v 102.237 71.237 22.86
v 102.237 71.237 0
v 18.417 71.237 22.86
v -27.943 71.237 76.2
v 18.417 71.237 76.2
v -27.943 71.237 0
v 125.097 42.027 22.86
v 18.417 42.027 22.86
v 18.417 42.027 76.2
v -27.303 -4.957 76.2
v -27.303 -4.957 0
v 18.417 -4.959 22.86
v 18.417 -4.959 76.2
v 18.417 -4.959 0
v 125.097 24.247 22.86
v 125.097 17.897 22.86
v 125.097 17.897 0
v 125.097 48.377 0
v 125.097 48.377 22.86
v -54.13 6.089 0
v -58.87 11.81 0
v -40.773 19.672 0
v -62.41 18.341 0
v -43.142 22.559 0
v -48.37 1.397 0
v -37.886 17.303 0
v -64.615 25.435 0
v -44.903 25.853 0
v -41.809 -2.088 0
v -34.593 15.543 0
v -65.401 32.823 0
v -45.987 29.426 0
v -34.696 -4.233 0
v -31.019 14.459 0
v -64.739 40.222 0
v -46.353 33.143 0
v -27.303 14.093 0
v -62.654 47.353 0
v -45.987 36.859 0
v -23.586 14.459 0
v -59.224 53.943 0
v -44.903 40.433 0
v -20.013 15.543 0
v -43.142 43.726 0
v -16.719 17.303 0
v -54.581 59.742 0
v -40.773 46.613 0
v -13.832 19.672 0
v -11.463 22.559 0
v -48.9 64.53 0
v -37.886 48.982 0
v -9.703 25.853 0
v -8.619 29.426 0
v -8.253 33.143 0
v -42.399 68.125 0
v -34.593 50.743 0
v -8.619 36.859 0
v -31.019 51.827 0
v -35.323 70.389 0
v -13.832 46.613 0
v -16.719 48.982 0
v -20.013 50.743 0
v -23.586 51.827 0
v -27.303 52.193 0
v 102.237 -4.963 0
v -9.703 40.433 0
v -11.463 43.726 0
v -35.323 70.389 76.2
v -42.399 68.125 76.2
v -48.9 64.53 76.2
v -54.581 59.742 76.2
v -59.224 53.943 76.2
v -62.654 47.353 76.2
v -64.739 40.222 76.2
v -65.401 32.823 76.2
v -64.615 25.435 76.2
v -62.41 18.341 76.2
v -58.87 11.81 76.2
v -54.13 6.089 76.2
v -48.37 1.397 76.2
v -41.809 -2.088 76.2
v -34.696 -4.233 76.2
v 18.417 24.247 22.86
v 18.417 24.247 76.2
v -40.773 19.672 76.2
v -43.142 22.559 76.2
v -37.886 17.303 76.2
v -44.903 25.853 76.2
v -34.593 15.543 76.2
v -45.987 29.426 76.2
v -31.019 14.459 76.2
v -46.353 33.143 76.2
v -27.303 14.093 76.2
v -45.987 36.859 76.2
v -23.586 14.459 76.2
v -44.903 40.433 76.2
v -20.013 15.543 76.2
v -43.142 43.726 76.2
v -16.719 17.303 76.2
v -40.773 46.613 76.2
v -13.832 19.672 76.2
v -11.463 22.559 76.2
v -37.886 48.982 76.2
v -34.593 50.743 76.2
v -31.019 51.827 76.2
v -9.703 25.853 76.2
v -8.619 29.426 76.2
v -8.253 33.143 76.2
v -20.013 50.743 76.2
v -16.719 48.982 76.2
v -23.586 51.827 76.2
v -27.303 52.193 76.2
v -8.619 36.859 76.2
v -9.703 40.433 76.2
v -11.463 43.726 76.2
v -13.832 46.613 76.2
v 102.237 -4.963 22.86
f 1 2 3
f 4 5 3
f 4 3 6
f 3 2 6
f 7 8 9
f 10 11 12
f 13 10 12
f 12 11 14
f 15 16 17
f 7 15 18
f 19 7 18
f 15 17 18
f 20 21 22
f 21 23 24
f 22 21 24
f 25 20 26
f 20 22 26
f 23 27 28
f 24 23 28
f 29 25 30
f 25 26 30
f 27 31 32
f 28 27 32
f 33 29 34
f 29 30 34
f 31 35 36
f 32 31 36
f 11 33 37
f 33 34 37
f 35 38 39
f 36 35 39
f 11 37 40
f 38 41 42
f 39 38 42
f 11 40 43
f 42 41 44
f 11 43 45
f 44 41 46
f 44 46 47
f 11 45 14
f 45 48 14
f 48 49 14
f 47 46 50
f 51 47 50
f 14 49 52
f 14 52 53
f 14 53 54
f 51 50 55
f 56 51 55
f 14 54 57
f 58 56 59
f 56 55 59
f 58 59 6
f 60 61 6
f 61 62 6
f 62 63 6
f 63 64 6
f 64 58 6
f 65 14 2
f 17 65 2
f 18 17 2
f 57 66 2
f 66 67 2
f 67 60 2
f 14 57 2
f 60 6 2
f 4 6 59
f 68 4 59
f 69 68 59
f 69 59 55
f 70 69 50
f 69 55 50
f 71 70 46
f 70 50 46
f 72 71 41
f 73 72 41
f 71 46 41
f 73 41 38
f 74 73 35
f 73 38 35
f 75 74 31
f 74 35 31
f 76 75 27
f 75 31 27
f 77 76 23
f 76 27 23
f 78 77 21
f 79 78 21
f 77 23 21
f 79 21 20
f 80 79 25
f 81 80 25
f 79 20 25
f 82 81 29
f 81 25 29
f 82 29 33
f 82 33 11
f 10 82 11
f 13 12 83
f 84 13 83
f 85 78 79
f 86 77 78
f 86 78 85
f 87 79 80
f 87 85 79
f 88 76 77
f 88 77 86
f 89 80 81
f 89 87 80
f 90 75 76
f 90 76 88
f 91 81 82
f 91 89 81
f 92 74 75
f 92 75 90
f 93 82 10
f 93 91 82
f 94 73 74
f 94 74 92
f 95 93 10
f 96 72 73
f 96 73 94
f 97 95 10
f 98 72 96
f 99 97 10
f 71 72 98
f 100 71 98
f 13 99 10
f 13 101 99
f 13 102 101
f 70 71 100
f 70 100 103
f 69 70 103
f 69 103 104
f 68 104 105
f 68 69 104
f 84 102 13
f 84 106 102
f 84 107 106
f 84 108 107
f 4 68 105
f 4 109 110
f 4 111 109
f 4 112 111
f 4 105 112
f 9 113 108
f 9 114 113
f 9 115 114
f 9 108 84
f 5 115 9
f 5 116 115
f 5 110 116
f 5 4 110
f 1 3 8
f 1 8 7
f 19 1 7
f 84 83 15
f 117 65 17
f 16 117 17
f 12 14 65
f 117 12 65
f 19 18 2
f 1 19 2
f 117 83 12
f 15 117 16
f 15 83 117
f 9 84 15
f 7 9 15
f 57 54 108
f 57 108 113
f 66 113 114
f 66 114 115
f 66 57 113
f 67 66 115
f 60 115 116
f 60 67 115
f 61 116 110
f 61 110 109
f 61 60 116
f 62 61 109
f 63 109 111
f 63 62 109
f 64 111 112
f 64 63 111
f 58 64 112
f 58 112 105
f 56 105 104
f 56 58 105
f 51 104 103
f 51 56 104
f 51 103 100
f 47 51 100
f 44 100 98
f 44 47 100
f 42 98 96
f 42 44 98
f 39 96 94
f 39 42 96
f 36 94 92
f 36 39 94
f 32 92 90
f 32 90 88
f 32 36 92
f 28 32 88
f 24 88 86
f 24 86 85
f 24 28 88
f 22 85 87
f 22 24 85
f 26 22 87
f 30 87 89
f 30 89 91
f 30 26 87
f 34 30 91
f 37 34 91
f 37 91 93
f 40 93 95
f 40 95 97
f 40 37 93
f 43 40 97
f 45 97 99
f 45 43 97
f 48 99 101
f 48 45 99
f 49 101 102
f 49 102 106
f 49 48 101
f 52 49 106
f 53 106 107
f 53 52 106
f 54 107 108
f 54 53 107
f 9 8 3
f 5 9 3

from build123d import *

# Parameters (mm, degrees)
F0_R     = 19.05
F1_DEPTH = 76.2
F2_DEPTH = 22.86
F0_W     = 106.68
F0_H     = 17.78
F3_DEPTH = 76.2
F5_DEPTH = 25.4


with BuildPart() as f1:
    # F0 (on Top) → F1 (new body)
    with BuildSketch(Plane.XY):
        with BuildLine():
            Line((18.417318, 71.237453), (-26.662783, 71.237453))
            Line((-26.662783, 71.237453), (-27.942582, 71.237453))
            ThreePointArc((-27.942582, 71.237453), (-65.401339, 32.822866), (-27.302682, -4.957173))
            Line((-27.302682, -4.957173), (18.417318, -4.959069))
            Line((18.417318, -4.959069), (18.417318, 24.247453))
            Line((18.417318, 24.247453), (18.417318, 42.027453))
            Line((18.417318, 42.027453), (18.417318, 71.237453))
        make_face()
        with Locations((-27.302682, 33.142827)):
            Circle(F0_R, mode=Mode.SUBTRACT)
    extrude(amount=F1_DEPTH)

    # F0 (on Top) → F2 (join)
    with BuildSketch(Plane.XY):
        Polygon((102.237318, 71.237453), (18.417318, 71.237453), (18.417318, 42.027453), (125.097318, 42.027453), (125.097318, 48.377453), align=None)
        Polygon((18.417318, 24.247453), (18.417318, -4.959069), (102.237318, -4.962547), (125.097318, 17.897453), (125.097318, 24.247453), align=None)
    extrude(amount=F2_DEPTH)

    # F0 (on Top) → F3 (join)
    with BuildSketch(Plane.XY):
        with Locations((71.757318, 33.137453)):
            Rectangle(F0_W, F0_H)
    extrude(amount=F3_DEPTH)

    # F4 (on face) → F5 (cut)
    with BuildSketch(Plane.XZ.offset(-24.247453)):
        Polygon((125.097318, 76.2), (18.417318, 76.2), (125.097318, 22.86), align=None)
    extrude(amount=-F5_DEPTH, mode=Mode.SUBTRACT)


solid = f1.part
